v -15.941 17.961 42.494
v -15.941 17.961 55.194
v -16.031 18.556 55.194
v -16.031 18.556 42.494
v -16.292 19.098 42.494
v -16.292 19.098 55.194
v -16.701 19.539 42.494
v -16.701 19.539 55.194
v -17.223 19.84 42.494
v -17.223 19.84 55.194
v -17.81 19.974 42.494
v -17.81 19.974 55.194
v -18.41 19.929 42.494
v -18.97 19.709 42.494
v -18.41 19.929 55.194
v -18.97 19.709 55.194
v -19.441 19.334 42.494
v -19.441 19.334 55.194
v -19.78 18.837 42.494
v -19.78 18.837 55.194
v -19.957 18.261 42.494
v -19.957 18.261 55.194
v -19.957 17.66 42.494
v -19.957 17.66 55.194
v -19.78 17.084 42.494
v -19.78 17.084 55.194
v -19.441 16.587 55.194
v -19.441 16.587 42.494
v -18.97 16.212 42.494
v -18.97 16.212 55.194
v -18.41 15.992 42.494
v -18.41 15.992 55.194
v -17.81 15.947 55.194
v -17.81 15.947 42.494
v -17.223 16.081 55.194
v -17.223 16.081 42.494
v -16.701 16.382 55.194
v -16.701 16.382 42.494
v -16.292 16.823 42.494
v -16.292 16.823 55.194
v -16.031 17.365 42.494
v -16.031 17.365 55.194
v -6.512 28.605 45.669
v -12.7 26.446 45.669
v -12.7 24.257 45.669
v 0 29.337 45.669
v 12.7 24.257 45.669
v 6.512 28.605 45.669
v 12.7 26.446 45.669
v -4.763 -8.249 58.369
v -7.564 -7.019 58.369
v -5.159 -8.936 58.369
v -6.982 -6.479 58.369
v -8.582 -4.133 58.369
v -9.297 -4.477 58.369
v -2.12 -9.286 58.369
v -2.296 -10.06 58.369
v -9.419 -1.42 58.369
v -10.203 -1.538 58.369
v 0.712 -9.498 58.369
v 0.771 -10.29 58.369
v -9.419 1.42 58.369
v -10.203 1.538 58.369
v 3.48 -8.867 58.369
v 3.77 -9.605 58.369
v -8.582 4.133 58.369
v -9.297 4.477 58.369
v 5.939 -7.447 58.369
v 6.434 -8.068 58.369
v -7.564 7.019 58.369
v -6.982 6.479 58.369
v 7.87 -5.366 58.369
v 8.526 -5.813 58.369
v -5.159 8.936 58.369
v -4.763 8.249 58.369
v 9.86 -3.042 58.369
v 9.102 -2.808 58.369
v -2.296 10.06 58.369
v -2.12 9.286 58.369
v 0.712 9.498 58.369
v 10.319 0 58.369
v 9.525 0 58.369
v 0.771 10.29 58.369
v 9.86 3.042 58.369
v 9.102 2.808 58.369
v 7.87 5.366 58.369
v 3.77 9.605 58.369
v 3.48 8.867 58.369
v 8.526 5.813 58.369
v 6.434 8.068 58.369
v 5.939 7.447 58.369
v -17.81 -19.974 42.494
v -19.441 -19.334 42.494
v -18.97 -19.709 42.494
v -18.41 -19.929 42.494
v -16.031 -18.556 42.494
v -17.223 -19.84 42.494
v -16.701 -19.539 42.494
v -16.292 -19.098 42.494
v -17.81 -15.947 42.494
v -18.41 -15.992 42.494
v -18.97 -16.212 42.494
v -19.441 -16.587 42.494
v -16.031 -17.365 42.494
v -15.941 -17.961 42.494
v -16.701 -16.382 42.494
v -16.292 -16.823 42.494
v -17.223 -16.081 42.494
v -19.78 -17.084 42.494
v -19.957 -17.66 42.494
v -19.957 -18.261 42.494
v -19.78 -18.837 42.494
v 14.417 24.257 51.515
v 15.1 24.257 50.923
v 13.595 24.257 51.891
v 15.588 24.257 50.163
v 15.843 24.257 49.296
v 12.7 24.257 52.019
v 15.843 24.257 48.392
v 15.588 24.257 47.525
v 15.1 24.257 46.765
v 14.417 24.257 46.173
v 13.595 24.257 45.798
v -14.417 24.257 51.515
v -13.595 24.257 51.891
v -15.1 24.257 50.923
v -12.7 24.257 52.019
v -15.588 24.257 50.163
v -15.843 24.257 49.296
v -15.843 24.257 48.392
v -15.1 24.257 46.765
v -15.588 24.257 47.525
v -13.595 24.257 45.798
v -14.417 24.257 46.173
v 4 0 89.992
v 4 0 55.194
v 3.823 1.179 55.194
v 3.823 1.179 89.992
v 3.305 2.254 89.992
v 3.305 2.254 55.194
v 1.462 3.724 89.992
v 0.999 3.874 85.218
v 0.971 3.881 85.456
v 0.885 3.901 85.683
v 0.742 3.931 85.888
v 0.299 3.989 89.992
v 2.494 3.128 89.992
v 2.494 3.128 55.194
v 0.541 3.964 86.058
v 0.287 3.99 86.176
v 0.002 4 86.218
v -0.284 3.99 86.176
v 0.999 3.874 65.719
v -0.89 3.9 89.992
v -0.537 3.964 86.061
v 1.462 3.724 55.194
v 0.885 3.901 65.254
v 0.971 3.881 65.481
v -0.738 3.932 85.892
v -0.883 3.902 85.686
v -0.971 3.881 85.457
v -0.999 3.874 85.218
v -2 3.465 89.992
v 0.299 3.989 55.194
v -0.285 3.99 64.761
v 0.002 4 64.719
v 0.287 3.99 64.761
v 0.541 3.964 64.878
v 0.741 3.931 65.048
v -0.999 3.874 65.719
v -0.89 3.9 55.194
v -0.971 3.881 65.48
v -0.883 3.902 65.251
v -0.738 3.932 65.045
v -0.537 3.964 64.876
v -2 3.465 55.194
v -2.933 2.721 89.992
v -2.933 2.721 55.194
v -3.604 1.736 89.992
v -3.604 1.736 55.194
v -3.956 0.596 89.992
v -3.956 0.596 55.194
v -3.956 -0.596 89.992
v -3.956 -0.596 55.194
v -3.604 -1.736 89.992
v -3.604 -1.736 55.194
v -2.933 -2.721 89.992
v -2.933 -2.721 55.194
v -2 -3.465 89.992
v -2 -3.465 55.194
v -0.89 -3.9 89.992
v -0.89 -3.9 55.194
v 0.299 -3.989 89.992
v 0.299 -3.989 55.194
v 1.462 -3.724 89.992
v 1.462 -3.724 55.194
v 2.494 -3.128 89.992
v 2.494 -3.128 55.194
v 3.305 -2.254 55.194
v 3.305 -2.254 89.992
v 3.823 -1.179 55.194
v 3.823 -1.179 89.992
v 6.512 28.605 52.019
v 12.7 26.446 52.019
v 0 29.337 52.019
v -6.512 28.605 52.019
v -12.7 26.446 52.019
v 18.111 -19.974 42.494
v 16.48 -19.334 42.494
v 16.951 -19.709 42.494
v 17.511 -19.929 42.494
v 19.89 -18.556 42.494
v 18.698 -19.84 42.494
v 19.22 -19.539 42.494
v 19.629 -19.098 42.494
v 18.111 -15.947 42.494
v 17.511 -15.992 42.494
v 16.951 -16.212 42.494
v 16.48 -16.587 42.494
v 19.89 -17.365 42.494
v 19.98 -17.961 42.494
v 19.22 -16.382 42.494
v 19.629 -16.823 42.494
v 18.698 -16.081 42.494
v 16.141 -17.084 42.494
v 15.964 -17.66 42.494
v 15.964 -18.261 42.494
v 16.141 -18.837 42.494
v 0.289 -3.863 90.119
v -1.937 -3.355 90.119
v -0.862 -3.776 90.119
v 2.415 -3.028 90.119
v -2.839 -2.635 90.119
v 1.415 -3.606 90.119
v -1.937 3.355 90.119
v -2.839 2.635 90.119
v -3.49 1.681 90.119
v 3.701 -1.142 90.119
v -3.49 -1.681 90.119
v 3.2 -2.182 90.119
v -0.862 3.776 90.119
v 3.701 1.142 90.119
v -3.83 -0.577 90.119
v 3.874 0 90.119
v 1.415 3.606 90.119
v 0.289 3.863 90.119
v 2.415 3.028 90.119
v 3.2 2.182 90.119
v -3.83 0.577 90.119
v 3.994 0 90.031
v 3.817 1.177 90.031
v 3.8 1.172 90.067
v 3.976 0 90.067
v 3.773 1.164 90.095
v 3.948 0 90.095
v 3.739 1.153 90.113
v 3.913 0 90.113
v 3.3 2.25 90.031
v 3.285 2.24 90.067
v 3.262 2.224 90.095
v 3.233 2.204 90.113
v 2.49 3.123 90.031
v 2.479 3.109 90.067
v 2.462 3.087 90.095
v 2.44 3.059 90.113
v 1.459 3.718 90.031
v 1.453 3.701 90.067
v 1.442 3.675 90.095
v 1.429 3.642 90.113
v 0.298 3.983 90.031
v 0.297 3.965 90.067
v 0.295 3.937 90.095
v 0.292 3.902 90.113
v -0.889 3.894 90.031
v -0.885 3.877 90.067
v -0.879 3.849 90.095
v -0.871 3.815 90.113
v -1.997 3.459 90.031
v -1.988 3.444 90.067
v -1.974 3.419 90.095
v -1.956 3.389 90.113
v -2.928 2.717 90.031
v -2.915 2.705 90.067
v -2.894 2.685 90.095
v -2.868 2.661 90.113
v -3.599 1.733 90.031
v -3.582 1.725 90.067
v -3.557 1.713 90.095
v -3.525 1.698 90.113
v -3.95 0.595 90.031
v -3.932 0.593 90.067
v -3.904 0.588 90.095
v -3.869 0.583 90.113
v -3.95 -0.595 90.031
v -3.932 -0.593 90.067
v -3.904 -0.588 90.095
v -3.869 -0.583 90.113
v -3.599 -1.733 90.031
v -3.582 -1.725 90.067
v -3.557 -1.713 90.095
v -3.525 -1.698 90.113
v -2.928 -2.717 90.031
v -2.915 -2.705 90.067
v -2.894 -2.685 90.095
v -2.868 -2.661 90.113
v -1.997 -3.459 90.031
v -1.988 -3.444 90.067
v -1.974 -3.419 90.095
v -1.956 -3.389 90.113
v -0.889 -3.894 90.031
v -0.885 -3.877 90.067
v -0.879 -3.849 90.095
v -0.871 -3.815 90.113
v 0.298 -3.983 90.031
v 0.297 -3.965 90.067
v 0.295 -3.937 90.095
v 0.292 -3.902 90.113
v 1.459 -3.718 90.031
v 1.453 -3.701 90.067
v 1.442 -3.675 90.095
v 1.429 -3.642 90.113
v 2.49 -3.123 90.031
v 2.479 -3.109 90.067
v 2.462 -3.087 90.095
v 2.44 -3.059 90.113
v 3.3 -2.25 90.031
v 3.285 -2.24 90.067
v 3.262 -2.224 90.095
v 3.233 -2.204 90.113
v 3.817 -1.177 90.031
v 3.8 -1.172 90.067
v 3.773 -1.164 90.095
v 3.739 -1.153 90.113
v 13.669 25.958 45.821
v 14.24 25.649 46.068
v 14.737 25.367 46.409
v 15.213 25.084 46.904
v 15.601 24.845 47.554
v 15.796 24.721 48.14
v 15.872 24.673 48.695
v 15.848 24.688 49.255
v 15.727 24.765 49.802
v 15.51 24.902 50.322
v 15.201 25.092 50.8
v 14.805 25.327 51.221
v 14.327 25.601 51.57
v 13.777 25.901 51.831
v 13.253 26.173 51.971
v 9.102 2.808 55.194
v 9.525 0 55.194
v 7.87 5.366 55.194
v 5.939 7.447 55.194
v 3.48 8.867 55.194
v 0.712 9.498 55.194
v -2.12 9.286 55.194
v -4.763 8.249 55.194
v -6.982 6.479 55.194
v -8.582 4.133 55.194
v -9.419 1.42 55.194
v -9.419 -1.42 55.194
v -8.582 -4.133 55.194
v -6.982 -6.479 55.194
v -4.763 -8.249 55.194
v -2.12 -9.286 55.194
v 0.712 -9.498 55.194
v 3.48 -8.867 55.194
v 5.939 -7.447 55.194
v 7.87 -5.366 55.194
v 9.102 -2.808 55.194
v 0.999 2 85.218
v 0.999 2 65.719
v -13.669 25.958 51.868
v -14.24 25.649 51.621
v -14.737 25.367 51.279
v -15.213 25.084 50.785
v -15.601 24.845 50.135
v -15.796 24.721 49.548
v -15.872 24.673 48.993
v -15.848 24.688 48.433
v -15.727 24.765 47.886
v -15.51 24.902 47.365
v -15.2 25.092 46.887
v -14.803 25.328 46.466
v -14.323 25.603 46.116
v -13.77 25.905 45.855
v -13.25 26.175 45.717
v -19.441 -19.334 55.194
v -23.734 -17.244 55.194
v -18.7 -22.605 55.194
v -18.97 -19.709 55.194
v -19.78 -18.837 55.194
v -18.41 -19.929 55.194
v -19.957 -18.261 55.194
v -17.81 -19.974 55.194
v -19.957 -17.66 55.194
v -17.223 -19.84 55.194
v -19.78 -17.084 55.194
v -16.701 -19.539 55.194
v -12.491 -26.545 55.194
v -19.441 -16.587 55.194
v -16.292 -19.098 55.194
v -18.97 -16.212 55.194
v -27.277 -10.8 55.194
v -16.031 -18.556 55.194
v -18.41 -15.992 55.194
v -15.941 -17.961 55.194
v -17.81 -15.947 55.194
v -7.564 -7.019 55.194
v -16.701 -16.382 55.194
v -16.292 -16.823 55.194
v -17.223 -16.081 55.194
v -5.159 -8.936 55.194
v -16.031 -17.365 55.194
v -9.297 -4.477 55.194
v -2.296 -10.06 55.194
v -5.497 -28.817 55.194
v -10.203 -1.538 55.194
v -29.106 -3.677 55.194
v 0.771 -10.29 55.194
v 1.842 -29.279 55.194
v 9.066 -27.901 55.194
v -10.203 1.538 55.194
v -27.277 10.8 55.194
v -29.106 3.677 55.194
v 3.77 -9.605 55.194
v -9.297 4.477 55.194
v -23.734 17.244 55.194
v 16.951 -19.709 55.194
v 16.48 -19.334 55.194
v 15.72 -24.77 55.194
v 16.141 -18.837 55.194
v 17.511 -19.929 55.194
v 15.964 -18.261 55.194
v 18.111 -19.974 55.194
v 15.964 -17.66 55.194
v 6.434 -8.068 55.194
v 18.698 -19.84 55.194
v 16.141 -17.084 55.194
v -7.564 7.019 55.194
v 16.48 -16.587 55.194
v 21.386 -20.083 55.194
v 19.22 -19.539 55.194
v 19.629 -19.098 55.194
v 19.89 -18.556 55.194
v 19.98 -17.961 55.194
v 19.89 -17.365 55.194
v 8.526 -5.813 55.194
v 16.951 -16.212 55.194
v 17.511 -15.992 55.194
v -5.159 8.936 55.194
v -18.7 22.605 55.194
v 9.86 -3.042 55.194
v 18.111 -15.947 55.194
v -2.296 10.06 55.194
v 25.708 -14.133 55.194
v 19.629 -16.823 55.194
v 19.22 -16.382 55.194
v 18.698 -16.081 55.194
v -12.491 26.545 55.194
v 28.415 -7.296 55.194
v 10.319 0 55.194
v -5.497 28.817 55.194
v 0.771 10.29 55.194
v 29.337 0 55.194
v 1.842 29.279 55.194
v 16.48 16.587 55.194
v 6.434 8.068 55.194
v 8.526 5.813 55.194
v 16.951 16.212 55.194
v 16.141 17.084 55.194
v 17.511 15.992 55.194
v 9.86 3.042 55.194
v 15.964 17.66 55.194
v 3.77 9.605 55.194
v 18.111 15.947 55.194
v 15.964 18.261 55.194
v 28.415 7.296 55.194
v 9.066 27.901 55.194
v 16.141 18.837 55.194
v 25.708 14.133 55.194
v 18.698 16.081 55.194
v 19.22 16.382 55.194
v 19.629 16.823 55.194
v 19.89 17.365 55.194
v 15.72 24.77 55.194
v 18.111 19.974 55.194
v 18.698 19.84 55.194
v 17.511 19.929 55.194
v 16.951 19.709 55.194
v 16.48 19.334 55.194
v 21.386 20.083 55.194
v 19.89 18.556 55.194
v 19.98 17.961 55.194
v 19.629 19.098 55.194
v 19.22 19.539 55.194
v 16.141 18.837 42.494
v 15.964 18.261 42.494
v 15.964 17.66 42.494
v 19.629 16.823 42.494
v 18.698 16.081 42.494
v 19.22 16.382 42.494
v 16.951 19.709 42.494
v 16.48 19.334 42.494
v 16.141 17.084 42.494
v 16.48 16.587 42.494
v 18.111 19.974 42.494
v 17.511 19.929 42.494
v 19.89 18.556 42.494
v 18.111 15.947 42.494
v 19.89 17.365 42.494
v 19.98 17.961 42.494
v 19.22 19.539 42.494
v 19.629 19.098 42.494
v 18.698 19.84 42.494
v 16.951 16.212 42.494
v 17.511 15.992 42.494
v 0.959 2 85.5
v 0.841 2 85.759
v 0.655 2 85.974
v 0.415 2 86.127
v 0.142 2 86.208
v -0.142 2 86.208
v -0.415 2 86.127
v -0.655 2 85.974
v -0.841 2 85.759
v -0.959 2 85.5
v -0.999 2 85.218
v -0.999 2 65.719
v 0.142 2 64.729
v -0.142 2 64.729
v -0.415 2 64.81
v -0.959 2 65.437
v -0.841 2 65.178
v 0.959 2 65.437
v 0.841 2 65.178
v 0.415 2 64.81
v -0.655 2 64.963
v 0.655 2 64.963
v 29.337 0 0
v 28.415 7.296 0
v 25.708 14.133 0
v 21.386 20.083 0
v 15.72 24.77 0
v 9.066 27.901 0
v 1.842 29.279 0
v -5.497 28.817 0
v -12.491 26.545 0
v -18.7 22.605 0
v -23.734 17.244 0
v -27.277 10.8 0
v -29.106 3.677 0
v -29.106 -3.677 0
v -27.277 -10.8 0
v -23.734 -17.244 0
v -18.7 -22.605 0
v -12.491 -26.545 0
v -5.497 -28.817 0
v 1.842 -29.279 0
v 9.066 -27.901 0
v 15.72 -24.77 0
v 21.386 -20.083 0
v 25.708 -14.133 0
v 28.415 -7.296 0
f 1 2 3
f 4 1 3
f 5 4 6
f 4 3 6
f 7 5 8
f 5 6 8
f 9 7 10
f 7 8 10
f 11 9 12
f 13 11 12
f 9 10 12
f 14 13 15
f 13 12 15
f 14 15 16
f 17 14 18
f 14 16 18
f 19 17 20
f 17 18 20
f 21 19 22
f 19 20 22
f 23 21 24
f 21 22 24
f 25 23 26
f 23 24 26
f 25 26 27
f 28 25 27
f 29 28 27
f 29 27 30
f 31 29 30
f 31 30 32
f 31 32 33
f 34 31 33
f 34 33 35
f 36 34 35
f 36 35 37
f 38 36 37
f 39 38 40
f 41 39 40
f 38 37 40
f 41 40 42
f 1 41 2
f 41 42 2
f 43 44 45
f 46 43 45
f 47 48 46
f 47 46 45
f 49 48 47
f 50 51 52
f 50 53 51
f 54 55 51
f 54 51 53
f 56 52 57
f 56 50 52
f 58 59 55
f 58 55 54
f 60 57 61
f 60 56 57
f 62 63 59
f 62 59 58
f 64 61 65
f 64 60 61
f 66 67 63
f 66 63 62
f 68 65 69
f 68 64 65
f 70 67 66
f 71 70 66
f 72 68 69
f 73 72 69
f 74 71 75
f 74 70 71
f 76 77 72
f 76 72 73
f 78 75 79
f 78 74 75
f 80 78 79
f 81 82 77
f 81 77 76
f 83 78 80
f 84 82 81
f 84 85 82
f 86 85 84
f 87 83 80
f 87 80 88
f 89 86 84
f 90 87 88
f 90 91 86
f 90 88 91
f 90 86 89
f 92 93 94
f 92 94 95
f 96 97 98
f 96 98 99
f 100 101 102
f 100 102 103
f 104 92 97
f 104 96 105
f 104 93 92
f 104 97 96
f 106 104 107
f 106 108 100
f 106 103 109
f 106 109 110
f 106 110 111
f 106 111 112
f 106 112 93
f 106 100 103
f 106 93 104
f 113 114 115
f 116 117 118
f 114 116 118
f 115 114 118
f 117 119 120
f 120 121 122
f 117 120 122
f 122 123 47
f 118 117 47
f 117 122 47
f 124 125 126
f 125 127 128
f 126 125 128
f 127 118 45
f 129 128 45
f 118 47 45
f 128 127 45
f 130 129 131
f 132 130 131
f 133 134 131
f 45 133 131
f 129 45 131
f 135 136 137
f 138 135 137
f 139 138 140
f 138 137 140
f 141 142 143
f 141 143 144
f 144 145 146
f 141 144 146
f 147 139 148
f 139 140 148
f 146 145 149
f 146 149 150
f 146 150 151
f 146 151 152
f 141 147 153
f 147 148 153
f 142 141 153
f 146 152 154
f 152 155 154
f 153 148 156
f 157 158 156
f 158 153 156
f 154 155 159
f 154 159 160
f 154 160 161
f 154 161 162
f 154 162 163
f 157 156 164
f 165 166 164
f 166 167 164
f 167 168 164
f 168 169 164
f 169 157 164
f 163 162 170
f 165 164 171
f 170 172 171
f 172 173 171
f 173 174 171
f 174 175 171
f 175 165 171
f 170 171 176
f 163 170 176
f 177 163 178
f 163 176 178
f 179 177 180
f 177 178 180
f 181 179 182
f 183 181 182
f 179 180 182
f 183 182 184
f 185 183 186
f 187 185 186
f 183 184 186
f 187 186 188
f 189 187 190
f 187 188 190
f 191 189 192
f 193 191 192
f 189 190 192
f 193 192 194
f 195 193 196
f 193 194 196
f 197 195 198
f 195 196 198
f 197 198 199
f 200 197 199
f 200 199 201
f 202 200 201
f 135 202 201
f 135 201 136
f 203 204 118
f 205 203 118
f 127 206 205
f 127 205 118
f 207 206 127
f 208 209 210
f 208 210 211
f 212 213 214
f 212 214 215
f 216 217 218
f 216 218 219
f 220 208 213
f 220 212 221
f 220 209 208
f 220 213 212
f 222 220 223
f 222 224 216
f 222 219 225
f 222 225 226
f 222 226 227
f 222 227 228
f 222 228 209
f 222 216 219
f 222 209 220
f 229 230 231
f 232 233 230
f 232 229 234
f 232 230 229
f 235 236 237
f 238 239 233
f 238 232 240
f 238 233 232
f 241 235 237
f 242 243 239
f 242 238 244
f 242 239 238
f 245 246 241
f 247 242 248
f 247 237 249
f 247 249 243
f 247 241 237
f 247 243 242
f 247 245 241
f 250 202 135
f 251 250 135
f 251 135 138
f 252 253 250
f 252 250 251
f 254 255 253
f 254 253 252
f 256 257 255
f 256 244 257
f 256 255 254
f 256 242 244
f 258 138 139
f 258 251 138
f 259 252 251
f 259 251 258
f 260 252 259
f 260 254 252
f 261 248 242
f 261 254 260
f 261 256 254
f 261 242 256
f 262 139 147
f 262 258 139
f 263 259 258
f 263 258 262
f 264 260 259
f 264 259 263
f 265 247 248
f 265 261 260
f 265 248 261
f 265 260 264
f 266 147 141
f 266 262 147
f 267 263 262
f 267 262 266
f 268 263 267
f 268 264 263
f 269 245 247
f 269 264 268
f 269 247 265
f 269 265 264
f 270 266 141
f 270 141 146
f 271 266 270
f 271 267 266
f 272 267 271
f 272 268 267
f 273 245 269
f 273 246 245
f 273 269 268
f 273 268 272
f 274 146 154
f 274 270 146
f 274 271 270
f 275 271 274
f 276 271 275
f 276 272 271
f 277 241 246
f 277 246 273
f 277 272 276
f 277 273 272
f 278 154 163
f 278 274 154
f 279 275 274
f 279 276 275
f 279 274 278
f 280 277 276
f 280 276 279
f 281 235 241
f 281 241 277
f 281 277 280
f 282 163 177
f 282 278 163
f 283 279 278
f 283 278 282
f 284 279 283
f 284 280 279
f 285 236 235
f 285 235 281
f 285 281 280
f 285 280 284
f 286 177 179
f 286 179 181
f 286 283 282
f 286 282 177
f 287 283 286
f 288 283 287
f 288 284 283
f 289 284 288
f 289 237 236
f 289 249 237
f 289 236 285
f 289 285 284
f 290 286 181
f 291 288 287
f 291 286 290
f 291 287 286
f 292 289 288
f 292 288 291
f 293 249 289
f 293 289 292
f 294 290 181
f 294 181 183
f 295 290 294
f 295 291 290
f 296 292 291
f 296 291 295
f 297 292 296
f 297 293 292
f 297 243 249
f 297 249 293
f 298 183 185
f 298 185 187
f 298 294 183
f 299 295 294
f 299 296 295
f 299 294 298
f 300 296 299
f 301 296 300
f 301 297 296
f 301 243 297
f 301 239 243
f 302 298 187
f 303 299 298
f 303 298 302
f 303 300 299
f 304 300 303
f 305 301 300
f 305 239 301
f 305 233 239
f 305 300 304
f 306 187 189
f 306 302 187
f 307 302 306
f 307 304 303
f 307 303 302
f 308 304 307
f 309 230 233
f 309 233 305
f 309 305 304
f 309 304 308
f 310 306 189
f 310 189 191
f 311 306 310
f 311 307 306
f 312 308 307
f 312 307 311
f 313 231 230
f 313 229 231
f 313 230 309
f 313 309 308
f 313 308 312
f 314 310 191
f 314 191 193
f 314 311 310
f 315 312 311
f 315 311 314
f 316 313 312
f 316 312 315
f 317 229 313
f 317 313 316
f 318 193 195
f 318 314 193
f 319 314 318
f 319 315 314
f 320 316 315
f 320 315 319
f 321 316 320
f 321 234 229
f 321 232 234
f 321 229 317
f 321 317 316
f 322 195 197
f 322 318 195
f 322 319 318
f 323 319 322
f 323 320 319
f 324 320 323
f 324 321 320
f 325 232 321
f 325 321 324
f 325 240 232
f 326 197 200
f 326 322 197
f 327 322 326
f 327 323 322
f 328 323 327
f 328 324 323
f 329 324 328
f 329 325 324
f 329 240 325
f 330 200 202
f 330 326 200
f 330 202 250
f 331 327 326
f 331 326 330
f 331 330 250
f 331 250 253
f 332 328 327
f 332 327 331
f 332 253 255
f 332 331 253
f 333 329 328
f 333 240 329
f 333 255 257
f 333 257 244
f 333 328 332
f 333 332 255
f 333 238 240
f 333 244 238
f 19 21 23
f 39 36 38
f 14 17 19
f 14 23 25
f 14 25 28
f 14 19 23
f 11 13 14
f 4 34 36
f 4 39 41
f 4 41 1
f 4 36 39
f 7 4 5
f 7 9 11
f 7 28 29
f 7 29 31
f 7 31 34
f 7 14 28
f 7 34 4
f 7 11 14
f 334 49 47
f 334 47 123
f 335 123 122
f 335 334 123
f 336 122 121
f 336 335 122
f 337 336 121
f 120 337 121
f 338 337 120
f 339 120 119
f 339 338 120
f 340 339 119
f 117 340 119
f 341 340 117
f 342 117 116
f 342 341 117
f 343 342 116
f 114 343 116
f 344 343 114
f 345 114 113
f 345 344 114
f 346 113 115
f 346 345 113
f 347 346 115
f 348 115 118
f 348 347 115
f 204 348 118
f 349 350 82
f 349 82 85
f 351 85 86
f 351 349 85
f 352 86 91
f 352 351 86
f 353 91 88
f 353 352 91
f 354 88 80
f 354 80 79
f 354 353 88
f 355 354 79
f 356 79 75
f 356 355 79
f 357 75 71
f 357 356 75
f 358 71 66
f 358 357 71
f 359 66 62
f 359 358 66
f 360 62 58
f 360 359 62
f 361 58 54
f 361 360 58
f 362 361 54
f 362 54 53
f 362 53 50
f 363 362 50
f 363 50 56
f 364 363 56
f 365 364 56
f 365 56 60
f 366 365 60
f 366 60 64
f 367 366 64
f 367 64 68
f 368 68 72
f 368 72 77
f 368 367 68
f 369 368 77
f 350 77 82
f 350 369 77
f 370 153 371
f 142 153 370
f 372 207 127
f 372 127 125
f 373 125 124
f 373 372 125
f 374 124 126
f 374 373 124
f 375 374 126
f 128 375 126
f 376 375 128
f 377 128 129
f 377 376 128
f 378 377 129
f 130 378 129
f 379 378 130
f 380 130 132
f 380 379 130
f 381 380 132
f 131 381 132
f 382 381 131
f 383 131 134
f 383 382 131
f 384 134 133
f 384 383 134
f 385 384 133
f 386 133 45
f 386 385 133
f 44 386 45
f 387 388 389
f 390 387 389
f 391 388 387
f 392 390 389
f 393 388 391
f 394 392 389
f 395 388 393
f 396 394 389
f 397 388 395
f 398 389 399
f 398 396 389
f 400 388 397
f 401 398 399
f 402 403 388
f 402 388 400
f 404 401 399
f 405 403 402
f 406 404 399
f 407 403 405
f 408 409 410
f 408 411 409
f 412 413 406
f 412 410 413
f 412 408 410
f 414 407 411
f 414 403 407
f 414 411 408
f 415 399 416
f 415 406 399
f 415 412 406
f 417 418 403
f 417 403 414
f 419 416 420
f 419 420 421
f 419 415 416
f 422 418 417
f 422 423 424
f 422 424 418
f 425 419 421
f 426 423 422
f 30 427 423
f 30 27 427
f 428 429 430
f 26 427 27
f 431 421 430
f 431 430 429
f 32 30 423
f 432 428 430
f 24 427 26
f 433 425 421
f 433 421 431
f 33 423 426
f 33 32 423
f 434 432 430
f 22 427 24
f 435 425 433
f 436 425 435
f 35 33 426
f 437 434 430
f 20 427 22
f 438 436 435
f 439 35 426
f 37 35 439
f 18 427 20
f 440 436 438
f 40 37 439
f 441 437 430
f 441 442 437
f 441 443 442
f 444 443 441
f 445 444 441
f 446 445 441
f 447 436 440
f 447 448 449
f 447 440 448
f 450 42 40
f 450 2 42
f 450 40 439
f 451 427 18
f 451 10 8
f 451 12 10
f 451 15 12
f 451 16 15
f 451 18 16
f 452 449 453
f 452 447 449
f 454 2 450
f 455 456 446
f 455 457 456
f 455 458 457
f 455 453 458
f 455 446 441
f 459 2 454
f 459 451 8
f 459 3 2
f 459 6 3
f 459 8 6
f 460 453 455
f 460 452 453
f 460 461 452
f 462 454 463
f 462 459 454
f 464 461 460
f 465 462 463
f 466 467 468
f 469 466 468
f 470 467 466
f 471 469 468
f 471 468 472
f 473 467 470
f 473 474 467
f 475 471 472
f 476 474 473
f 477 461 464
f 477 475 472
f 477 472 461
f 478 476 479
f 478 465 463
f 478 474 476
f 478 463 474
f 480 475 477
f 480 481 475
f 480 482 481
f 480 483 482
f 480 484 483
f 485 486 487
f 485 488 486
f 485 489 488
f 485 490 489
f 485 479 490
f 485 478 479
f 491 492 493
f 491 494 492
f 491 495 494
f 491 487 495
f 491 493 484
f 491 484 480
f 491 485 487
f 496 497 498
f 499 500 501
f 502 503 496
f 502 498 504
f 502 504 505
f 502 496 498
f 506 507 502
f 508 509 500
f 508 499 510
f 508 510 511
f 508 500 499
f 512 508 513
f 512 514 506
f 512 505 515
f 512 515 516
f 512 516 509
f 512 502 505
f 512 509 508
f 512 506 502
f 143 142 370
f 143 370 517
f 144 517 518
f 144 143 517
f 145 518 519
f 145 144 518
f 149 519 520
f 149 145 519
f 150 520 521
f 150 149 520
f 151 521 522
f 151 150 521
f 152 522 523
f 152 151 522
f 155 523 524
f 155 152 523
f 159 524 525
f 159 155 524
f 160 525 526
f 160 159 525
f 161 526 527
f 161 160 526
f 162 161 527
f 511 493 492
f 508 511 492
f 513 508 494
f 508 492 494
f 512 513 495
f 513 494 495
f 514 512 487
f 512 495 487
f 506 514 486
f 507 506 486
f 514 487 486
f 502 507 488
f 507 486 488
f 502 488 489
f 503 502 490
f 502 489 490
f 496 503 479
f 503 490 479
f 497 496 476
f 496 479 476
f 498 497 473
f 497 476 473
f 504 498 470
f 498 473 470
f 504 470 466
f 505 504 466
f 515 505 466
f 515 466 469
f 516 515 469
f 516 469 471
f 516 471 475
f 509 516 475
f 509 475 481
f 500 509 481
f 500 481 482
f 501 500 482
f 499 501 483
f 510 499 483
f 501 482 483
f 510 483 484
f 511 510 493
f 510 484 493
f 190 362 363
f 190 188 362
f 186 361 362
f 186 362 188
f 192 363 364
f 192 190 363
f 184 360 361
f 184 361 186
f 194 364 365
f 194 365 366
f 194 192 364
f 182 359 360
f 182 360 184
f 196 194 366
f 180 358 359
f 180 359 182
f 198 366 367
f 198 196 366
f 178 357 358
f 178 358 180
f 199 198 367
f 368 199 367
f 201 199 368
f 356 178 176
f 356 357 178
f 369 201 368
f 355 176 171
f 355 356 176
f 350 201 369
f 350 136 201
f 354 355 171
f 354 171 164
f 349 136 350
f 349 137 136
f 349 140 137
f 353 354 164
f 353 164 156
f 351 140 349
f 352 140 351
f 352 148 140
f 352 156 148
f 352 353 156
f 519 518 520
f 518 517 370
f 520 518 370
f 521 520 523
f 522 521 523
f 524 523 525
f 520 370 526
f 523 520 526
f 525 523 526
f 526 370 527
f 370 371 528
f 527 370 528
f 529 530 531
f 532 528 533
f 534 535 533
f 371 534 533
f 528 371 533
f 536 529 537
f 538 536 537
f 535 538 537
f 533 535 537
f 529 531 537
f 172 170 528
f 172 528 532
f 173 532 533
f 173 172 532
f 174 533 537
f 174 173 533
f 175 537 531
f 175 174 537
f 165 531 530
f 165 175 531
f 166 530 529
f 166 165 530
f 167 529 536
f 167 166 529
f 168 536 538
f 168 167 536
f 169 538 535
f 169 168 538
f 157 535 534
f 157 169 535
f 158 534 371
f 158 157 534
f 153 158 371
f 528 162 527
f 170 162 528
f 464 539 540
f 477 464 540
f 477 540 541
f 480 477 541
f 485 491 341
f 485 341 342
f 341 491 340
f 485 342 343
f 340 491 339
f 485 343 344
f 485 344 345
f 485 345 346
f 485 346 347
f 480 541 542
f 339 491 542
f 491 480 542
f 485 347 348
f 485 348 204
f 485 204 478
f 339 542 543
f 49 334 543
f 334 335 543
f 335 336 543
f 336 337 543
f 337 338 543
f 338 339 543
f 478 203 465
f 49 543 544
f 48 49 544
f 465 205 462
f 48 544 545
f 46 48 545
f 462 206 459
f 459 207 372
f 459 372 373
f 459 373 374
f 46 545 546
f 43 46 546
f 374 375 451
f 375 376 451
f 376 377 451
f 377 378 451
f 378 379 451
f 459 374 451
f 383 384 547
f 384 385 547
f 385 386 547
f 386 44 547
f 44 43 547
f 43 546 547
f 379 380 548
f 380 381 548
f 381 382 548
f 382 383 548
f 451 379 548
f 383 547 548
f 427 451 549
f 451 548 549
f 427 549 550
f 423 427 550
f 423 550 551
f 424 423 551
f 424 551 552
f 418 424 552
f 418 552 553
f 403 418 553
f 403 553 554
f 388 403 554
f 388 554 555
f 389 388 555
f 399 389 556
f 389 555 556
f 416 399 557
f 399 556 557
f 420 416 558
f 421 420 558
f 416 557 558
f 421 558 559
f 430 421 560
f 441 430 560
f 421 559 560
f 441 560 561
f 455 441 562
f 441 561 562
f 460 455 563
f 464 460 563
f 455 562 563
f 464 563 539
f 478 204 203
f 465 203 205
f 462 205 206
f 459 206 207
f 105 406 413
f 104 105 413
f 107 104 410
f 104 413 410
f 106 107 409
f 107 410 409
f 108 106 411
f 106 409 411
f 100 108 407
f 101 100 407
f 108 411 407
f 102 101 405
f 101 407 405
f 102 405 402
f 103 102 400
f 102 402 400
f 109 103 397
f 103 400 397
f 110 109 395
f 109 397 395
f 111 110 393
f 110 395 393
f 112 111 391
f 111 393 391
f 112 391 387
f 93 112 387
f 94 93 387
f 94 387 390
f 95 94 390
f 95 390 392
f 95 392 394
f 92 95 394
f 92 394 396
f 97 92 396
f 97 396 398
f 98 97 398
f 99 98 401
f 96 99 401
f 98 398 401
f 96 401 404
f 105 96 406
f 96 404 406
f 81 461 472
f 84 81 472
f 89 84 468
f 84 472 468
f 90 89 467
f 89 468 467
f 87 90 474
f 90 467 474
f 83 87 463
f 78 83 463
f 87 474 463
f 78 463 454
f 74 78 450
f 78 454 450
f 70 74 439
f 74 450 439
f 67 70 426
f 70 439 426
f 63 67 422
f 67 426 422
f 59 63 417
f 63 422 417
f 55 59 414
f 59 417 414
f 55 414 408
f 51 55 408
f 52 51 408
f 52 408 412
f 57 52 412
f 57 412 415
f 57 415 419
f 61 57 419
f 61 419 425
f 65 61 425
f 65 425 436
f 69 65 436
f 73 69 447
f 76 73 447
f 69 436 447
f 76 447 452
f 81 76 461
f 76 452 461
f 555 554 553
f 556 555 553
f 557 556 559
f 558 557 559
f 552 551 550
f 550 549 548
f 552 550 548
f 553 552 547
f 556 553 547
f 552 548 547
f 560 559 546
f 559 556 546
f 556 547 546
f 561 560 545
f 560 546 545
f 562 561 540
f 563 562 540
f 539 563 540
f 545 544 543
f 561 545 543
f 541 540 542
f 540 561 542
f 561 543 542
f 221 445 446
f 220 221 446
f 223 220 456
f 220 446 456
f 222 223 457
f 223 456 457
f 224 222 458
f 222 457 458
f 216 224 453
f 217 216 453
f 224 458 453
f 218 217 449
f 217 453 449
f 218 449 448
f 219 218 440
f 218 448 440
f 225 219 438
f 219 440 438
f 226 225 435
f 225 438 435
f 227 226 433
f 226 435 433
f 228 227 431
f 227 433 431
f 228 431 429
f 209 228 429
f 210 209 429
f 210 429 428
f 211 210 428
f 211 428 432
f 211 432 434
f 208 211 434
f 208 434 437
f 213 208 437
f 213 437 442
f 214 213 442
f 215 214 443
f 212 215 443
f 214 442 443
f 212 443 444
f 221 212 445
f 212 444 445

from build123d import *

# Parameters (mm, degrees)
SKETCH1_R           = 29.337
BOSS_EXTRUDE1_DEPTH = 55.1942
SKETCH2_R           = 10.31875
SKETCH2_R_2         = 9.525
BOSS_EXTRUDE2_DEPTH = 3.175
SKETCH3_R           = 4.0005
BOSS_EXTRUDE3_DEPTH = 34.925
SKETCH4_R           = 2.0193
CUT_EXTRUDE1_DEPTH  = 12.7
CUT_EXTRUDE2_DEPTH  = 5.08
CUT_EXTRUDE3_DEPTH  = 2
FILLET1_R           = 0.127


with BuildPart() as part:
    # Sketch1 → Boss-Extrude1 (new body)
    with BuildSketch(Plane.XY):
        Circle(SKETCH1_R)
    extrude(amount=BOSS_EXTRUDE1_DEPTH)

    # Sketch2 → Boss-Extrude2 (add)
    with BuildSketch(Plane.XY.offset(55.1942)):
        Circle(SKETCH2_R)
        Circle(SKETCH2_R_2, mode=Mode.SUBTRACT)
    extrude(amount=BOSS_EXTRUDE2_DEPTH)

    # Sketch3 → Boss-Extrude3 (add)
    with BuildSketch(Plane.XY.offset(55.1942)):
        Circle(SKETCH3_R)
    extrude(amount=BOSS_EXTRUDE3_DEPTH)

    # Sketch4 → Cut-Extrude1 (cut)
    with BuildSketch(Plane.XY.offset(55.1942)):
        with Locations((17.960512242, -17.960512242)):
            Circle(SKETCH4_R)
        with Locations((-17.960512242, -17.960512242)):
            Circle(SKETCH4_R)
        with Locations((-17.960512242, 17.960512242)):
            Circle(SKETCH4_R)
        with Locations((17.960512242, 17.960512242)):
            Circle(SKETCH4_R)
    extrude(amount=-CUT_EXTRUDE1_DEPTH, mode=Mode.SUBTRACT)

    # Sketch5 → Cut-Extrude2 (cut)
    with BuildSketch(Plane(origin=(0, 29.337, 0), x_dir=(1, 0, 0), z_dir=(0, 1, 0))):
        with BuildLine():
            Line((12.7, -52.0192), (-12.7, -52.0192))
            ThreePointArc((-12.7, -52.0192), (-15.875, -48.8442), (-12.7, -45.6692))
            Line((-12.7, -45.6692), (12.7, -45.6692))
            ThreePointArc((12.7, -45.6692), (15.875, -48.8442), (12.7, -52.0192))
        make_face()
    extrude(amount=-CUT_EXTRUDE2_DEPTH, mode=Mode.SUBTRACT)

    # Sketch6 → Cut-Extrude3 (cut)
    with BuildSketch(Plane(origin=(0, 4.0005, 0), x_dir=(1, 0, 0), z_dir=(0, 1, 0))):
        with BuildLine():
            Line((0.99949, -65.71869), (0.99949, -85.21827))
            ThreePointArc((0.99949, -85.21827), (0, -86.21776), (-0.99949, -85.21827))
            Line((-0.99949, -85.21827), (-0.99949, -65.71869))
            ThreePointArc((-0.99949, -65.71869), (0, -64.7192), (0.99949, -65.71869))
        make_face()
    extrude(amount=-CUT_EXTRUDE3_DEPTH, mode=Mode.SUBTRACT)

    # Fillet1
    fillet1_edges = [part.edges().sort_by_distance(p)[0] for p in [
        (-4.0005, 0, 90.1192),
    ]]
    fillet(fillet1_edges, radius=FILLET1_R)


solid = part.part
